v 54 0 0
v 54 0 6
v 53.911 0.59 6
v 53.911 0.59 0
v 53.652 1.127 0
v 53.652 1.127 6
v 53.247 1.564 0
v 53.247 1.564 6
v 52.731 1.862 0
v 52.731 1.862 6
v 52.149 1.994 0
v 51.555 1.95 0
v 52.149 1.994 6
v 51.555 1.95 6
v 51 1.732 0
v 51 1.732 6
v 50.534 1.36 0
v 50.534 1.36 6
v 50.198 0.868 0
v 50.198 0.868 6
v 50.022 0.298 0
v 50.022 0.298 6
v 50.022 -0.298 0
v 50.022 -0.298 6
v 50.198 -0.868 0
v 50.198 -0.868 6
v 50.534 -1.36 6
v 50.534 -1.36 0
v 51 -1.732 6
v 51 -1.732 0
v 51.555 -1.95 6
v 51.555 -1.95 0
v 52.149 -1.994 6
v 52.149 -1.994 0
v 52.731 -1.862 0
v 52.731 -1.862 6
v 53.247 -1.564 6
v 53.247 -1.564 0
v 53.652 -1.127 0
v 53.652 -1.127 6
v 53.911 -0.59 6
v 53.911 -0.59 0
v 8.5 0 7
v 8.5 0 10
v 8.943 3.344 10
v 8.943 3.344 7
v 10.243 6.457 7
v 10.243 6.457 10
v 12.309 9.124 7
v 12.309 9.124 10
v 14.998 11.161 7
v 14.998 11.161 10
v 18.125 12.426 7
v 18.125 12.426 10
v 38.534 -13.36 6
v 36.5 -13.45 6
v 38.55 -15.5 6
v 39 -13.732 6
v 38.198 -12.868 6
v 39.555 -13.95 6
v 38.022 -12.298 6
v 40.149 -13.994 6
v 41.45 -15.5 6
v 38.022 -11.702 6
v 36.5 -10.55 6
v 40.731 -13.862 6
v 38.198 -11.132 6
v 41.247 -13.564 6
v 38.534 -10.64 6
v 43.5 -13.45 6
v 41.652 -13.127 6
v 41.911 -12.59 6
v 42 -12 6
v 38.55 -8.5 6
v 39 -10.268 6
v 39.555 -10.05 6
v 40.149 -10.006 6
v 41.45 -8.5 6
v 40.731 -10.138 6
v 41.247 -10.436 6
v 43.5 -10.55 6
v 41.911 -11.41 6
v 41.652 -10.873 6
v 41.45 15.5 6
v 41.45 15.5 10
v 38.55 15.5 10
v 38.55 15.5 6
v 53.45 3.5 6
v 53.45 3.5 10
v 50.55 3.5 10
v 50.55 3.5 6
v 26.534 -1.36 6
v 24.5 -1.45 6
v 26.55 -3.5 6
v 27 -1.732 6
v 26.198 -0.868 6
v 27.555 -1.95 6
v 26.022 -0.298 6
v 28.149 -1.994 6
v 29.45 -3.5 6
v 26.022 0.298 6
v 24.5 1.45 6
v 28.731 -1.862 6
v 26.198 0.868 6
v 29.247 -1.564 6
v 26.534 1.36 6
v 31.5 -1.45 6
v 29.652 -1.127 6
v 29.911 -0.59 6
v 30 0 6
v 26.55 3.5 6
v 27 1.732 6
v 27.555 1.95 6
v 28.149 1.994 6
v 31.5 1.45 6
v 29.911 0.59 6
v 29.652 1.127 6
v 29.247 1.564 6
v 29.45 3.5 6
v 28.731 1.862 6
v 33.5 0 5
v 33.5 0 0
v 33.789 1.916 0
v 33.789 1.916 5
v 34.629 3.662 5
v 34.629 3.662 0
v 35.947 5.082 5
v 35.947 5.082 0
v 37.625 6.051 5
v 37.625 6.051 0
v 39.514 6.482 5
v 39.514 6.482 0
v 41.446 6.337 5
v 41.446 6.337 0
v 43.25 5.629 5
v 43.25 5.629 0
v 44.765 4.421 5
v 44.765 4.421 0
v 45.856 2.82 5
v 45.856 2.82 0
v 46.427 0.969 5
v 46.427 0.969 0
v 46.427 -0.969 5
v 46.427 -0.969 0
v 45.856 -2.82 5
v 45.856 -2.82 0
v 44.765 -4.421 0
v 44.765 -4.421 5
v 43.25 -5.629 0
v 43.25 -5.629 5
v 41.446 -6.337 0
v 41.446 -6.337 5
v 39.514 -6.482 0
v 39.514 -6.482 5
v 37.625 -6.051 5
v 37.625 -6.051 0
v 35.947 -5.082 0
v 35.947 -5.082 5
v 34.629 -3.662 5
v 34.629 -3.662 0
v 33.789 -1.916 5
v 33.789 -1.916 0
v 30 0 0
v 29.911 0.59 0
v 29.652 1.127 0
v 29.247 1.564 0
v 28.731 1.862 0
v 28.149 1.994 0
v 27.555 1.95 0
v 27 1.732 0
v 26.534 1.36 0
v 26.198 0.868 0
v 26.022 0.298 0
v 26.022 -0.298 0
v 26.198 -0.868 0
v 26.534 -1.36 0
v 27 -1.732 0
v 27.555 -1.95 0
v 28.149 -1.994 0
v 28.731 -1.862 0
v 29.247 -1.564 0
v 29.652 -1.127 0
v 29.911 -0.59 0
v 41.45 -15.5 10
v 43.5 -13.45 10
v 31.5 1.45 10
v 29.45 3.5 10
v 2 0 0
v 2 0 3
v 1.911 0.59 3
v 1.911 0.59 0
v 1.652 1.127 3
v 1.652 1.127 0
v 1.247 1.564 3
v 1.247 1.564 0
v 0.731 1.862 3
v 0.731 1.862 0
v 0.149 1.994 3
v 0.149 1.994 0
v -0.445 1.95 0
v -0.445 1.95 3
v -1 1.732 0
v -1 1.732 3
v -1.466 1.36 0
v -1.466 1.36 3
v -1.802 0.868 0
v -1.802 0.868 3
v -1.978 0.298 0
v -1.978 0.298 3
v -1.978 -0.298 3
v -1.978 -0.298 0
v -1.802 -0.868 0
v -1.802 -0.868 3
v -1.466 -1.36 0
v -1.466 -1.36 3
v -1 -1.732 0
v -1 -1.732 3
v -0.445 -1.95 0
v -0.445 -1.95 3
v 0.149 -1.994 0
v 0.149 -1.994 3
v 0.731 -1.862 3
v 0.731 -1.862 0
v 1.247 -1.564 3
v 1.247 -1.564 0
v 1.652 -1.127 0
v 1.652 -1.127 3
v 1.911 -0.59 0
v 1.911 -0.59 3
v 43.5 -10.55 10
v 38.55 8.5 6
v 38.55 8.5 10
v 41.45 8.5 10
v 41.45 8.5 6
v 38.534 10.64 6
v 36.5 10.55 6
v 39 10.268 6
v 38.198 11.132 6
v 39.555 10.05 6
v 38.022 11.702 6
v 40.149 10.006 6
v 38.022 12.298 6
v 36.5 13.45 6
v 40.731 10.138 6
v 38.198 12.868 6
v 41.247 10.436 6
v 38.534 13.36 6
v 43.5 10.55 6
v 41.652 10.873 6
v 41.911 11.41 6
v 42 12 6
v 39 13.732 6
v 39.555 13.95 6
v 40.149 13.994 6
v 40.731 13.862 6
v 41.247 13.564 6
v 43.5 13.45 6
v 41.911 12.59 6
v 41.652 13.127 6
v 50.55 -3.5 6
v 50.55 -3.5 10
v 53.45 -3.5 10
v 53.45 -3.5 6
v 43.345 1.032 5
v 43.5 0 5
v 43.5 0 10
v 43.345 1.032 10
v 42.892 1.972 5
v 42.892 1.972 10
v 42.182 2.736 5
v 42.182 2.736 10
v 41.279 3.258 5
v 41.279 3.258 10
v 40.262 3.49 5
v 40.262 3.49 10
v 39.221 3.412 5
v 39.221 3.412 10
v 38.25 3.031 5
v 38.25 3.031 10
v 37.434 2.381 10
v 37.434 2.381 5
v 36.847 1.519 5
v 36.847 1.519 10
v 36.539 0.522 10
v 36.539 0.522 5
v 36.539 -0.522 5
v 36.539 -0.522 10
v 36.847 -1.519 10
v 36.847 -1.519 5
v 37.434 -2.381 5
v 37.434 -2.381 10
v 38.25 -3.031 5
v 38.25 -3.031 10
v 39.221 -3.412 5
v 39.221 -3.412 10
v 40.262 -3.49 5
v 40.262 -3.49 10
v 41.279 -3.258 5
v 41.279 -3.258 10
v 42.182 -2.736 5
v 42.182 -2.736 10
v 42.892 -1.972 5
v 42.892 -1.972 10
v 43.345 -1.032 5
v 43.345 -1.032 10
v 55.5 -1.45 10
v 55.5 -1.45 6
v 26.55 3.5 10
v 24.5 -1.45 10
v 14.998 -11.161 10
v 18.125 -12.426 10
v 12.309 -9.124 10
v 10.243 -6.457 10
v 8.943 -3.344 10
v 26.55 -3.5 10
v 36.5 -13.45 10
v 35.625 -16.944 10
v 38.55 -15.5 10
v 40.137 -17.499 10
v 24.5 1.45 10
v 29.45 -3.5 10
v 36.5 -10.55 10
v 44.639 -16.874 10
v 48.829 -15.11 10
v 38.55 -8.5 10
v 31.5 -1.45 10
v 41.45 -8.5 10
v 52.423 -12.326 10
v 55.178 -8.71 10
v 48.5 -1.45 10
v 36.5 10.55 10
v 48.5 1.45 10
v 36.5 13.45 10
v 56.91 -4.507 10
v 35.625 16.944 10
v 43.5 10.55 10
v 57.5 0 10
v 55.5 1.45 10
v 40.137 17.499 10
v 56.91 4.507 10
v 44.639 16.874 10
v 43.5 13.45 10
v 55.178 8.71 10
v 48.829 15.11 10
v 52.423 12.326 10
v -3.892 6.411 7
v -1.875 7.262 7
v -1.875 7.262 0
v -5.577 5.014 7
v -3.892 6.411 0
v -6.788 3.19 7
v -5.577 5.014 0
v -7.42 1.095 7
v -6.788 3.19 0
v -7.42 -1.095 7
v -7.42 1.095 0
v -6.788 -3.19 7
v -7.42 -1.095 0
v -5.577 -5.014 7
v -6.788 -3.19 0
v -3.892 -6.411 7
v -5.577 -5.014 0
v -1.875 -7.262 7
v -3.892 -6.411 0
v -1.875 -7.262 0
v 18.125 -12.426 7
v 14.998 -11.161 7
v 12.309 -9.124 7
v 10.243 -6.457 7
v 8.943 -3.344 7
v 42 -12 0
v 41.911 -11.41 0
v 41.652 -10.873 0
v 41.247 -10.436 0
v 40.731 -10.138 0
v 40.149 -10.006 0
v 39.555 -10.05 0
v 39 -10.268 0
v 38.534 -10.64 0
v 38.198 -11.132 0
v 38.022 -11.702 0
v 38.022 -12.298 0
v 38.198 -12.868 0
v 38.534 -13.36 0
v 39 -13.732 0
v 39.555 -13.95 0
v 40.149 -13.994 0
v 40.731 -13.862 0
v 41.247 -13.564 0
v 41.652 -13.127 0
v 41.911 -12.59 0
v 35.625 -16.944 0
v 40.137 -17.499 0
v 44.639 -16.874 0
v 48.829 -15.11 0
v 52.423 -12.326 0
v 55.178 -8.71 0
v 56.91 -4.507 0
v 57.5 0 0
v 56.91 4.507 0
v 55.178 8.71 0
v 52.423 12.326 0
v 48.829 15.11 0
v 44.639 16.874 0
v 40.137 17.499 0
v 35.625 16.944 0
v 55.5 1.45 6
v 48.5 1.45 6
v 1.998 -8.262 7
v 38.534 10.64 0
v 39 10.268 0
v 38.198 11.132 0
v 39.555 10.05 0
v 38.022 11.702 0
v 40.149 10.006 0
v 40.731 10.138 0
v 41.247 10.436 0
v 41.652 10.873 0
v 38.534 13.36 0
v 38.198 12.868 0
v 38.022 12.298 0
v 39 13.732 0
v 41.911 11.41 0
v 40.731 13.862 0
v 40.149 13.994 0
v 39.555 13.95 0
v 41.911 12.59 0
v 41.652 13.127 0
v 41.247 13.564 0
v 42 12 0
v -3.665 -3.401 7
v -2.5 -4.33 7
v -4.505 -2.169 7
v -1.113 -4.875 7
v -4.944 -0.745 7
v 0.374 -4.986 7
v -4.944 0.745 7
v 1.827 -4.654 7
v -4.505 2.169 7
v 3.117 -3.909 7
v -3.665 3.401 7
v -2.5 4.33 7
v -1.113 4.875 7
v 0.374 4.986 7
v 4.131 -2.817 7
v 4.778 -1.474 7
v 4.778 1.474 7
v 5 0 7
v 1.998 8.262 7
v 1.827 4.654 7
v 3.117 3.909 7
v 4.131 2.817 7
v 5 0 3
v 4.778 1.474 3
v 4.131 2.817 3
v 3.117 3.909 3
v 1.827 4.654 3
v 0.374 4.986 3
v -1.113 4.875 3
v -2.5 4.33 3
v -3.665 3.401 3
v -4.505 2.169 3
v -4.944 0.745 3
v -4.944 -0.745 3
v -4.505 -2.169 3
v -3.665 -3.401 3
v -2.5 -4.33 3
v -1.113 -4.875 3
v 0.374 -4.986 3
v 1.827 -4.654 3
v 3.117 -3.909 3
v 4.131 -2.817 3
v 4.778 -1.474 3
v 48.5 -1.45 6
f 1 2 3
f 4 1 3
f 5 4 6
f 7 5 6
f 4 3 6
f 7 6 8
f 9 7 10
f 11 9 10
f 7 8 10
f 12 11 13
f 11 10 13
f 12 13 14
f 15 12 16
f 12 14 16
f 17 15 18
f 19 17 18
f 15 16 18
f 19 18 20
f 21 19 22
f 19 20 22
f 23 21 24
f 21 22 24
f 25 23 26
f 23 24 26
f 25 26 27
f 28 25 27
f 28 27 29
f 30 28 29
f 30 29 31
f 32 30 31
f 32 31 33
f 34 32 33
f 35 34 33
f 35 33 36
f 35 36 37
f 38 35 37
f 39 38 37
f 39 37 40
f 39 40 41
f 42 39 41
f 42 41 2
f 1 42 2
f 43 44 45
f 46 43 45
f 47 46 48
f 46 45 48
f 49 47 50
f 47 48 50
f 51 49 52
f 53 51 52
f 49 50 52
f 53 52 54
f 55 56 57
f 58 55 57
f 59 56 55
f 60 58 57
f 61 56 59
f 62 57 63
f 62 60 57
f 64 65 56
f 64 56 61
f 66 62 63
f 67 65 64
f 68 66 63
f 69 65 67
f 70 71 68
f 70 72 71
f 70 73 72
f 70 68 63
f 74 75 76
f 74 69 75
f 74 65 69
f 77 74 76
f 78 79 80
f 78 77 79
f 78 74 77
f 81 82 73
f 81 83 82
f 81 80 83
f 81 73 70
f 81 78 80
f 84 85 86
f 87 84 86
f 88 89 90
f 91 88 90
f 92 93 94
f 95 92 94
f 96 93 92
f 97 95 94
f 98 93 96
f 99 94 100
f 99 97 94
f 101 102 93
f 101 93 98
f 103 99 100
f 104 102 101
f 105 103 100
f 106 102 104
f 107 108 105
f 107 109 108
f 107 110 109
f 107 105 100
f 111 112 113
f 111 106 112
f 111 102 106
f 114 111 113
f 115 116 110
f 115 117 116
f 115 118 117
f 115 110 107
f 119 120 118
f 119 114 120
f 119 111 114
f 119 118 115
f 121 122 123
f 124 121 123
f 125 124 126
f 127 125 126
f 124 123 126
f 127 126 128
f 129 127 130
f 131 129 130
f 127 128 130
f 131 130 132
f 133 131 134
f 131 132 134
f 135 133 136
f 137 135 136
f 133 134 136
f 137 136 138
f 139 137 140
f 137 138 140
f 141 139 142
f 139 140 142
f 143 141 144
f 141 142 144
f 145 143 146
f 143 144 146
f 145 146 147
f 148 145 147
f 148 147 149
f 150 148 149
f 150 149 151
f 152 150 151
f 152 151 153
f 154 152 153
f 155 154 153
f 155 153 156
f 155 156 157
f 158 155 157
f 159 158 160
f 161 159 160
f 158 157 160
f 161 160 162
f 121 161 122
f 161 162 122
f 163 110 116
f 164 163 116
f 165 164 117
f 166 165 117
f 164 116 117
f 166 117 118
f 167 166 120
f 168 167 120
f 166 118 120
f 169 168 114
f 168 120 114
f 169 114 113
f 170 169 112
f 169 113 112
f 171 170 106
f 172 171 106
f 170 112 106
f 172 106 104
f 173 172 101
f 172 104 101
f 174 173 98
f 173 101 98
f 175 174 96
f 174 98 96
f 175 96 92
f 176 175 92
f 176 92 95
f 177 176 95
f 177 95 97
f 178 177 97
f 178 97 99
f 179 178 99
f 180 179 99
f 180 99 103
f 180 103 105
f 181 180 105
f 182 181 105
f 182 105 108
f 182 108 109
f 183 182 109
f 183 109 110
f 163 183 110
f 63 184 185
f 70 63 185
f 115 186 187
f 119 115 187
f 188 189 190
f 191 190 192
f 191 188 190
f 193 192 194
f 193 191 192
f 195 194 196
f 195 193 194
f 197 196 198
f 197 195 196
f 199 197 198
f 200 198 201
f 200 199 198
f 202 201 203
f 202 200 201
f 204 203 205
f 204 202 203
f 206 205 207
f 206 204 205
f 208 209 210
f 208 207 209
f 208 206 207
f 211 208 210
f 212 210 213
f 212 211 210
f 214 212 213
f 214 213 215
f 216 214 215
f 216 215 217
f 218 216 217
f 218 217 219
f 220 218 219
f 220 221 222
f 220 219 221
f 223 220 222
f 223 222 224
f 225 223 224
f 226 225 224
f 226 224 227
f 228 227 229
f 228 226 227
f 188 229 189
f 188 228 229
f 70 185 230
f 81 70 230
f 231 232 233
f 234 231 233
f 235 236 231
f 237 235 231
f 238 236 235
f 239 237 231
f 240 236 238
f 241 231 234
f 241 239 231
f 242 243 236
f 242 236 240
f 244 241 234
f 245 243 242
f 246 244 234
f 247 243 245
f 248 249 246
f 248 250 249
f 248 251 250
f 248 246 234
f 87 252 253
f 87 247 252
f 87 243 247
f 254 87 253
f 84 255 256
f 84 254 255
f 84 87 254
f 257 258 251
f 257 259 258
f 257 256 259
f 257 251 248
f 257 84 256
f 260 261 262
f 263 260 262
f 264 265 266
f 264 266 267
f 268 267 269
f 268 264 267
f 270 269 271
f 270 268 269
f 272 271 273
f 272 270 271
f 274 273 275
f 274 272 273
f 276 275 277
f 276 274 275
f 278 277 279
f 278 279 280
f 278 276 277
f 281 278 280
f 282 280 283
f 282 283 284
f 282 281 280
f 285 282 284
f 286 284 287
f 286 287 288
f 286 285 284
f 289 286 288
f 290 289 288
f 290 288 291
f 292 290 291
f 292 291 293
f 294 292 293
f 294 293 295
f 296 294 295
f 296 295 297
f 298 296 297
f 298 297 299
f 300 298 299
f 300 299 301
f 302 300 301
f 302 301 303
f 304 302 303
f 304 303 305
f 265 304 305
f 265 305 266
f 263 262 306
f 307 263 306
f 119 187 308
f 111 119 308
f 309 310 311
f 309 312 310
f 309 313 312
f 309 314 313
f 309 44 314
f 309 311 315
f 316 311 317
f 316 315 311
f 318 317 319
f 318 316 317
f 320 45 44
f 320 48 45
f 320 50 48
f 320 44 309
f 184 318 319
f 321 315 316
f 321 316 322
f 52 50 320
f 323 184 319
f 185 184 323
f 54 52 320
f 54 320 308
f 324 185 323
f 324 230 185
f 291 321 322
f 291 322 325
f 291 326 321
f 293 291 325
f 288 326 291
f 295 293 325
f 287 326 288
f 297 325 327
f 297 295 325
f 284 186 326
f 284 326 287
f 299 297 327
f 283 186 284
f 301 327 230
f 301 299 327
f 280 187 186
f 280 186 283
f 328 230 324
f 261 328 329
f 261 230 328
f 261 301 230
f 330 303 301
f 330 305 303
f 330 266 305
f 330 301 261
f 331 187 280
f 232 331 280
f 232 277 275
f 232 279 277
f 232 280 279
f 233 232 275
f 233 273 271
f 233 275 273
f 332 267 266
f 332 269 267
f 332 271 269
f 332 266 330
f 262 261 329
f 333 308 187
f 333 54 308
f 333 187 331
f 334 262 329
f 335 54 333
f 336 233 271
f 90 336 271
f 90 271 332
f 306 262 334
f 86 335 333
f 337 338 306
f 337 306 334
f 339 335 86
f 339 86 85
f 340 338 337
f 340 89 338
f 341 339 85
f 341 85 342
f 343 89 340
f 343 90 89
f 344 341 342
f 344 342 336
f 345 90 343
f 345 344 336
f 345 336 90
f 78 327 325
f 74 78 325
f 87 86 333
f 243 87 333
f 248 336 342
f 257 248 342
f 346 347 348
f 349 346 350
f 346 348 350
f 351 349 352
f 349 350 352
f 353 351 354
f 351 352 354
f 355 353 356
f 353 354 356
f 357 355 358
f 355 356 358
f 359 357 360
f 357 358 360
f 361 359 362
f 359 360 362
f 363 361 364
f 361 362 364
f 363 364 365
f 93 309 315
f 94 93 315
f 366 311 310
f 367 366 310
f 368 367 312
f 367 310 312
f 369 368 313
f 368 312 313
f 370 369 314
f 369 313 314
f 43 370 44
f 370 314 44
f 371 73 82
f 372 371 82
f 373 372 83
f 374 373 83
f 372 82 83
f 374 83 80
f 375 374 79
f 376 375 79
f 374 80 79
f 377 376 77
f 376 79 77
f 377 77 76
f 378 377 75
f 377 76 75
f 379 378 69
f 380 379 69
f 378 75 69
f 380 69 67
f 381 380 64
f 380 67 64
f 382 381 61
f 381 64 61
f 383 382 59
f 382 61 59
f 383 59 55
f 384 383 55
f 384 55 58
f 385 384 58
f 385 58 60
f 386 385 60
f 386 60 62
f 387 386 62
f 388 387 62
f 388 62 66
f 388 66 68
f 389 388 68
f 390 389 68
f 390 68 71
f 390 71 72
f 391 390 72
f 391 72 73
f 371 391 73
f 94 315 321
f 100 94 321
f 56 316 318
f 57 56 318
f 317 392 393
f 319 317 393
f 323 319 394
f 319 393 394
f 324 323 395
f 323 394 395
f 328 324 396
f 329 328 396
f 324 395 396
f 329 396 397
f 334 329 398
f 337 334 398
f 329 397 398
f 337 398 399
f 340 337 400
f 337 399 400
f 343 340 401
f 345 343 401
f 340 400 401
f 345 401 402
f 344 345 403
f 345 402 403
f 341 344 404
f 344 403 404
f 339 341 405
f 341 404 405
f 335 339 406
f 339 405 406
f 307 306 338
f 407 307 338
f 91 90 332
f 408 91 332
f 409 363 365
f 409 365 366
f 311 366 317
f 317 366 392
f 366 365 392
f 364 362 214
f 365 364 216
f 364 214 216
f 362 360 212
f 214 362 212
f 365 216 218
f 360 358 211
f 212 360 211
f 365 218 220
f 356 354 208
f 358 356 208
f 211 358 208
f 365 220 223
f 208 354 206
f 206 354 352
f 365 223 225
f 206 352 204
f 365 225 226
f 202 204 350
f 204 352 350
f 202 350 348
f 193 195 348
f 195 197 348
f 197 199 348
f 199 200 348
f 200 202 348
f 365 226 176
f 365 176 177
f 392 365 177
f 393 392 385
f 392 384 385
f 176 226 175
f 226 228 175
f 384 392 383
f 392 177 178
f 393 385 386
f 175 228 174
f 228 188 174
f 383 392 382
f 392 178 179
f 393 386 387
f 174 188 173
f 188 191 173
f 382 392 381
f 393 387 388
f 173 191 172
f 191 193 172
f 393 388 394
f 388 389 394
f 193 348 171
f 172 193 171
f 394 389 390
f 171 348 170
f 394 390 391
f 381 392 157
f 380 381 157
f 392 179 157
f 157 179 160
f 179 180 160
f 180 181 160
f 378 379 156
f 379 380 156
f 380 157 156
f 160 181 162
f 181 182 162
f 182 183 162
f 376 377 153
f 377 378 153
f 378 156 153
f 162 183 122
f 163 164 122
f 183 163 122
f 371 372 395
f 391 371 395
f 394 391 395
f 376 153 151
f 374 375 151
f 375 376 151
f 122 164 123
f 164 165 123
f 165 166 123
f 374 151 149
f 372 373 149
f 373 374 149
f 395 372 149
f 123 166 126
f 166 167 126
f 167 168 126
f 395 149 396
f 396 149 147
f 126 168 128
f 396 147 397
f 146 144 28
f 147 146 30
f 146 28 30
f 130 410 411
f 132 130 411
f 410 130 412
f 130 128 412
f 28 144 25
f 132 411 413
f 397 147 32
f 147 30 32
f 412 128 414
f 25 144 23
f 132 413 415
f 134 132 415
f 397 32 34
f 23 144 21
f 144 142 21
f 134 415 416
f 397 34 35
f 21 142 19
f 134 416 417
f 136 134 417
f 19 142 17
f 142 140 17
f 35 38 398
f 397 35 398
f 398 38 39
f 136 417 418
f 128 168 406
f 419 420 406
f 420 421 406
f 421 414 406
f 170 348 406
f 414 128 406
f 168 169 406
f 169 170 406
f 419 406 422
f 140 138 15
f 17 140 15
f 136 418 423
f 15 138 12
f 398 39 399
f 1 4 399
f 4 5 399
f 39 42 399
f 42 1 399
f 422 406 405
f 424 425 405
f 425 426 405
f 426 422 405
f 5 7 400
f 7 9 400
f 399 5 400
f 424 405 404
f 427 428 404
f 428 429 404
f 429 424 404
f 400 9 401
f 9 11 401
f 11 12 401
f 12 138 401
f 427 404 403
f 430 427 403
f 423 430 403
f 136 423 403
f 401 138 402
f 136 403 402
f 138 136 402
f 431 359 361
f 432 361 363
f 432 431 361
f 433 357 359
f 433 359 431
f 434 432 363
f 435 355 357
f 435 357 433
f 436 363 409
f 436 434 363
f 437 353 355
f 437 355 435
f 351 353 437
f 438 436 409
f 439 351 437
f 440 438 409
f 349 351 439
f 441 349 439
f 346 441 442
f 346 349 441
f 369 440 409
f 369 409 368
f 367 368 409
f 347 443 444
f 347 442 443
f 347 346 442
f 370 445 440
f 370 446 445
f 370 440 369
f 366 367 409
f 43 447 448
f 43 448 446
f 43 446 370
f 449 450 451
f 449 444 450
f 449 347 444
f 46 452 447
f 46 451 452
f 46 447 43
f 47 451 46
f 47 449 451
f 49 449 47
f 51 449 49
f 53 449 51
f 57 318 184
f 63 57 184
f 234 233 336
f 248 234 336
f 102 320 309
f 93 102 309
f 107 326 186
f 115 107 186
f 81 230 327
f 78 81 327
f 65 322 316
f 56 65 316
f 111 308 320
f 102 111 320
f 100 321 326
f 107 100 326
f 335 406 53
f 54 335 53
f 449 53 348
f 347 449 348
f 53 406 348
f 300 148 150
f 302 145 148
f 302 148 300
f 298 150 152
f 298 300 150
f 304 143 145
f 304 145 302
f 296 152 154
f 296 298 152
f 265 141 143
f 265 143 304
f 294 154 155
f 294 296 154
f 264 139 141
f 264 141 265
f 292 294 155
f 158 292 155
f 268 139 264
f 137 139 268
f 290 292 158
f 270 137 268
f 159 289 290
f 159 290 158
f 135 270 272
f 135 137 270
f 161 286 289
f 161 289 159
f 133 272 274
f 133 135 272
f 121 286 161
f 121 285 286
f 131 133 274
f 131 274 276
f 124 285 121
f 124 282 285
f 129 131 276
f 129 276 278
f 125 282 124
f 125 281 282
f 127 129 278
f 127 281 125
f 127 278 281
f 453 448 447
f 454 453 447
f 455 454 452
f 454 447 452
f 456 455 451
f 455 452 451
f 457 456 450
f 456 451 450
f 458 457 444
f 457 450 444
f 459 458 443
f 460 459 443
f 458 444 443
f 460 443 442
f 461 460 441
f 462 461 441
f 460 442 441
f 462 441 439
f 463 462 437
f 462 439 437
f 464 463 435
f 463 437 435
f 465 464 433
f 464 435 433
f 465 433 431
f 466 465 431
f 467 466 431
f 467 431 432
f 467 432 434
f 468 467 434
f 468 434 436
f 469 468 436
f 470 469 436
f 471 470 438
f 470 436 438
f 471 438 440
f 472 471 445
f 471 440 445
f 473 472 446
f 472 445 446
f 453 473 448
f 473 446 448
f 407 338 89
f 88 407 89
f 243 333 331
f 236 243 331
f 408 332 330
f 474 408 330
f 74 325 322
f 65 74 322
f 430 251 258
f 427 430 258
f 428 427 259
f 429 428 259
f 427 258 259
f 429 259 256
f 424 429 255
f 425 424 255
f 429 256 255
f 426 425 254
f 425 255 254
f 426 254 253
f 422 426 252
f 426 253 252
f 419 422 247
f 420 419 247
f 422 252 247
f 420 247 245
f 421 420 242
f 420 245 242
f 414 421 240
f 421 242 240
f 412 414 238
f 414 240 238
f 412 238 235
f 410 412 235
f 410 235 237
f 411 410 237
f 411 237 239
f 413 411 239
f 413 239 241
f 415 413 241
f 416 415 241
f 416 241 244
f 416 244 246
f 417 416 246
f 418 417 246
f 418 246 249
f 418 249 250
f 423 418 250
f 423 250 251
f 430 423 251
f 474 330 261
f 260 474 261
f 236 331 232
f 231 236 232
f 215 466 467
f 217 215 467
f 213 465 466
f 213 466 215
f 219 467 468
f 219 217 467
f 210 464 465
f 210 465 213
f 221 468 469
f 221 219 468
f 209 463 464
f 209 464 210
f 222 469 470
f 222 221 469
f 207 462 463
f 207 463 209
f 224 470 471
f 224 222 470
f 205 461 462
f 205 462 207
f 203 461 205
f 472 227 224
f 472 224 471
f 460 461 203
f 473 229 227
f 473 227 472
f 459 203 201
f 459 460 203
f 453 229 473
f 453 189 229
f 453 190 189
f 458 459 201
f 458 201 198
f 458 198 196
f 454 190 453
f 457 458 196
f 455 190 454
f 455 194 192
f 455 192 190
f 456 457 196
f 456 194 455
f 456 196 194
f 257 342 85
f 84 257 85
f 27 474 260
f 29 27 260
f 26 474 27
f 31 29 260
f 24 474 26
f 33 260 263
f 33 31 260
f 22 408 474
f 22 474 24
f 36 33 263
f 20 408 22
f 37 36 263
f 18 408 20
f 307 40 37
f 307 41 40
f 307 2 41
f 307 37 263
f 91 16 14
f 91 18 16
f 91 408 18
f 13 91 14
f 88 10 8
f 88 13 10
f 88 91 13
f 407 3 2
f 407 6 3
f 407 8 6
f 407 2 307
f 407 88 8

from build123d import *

# Parameters (mm, degrees)
SKETCH1_R           = 2
SKETCH1_R_2         = 3.5
BOSS_EXTRUDE1_DEPTH = 10
SKETCH4_R           = 2
CUT_EXTRUDE2_DEPTH  = 61.930288035
CUT_EXTRUDE3_DEPTH  = 4
CUT_EXTRUDE4_START  = -3
SKETCH5_R           = 2
CUT_EXTRUDE4_DEPTH  = 3
SKETCH6_R           = 5
CUT_EXTRUDE5_DEPTH  = 4
SKETCH7_R           = 6.5
CUT_EXTRUDE6_DEPTH  = 5


with BuildPart() as part:
    # Sketch1 → Boss-Extrude1 (new body)
    with BuildSketch(Plane.XY):
        with BuildLine():
            Line((35.625, 16.94430214), (-1.875, 7.261843774))
            ThreePointArc((-1.875, 7.261843774), (-7.5, 0), (-1.875, -7.261843774))
            Line((-1.875, -7.261843774), (35.625, -16.94430214))
            ThreePointArc((35.625, -16.94430214), (57.5, 0), (35.625, 16.94430214))
        make_face()
        Circle(SKETCH1_R, mode=Mode.SUBTRACT)
        with Locations((40, 0)):
            Circle(SKETCH1_R_2, mode=Mode.SUBTRACT)
    extrude(amount=BOSS_EXTRUDE1_DEPTH)

    # Sketch4 → Cut-Extrude2 (cut, through all)
    with BuildSketch(Plane.XY.offset(10)):
        with Locations((28, 0)):
            Circle(SKETCH4_R)
        with Locations((40, -12)):
            Circle(SKETCH4_R)
        with Locations((52, 0)):
            Circle(SKETCH4_R)
        with Locations((40, 12)):
            Circle(SKETCH4_R)
    extrude(amount=-CUT_EXTRUDE2_DEPTH, mode=Mode.SUBTRACT)

    # Sketch4_3 → Cut-Extrude3 (cut)
    with BuildSketch(Plane.XY.offset(10)):
        Polygon((38.550252532, 8.5), (41.449747468, 8.5), (43.5, 10.550252532), (43.5, 13.449747468), (41.449747468, 15.5), (38.550252532, 15.5), (36.5, 13.449747468), (36.5, 10.550252532), align=None)
        Polygon((50.550252532, 3.5), (48.5, 1.449747468), (48.5, -1.449747468), (50.550252532, -3.5), (53.449747468, -3.5), (55.5, -1.449747468), (55.5, 1.449747468), (53.449747468, 3.5), align=None)
        Polygon((43.5, -10.550252532), (41.449747468, -8.5), (38.550252532, -8.5), (36.5, -10.550252532), (36.5, -13.449747468), (38.550252532, -15.5), (41.449747468, -15.5), (43.5, -13.449747468), align=None)
        Polygon((29.449747468, -3.5), (31.5, -1.449747468), (31.5, 1.449747468), (29.449747468, 3.5), (26.550252532, 3.5), (24.5, 1.449747468), (24.5, -1.449747468), (26.550252532, -3.5), align=None)
    extrude(amount=-CUT_EXTRUDE3_DEPTH, mode=Mode.SUBTRACT)

    # Sketch5 → Cut-Extrude4 (cut)
    with BuildSketch(Plane.XY.offset(10).offset(CUT_EXTRUDE4_START)):
        with BuildLine():
            Line((18.124999859, 12.425821533), (-1.875, 7.261843774))
            ThreePointArc((-1.875, 7.261843774), (-7.5, 0), (-1.875, -7.261843774))
            Line((-1.875, -7.261843774), (18.124999918, -12.425821548))
            ThreePointArc((18.124999918, -12.425821548), (8.5, -3.1e-08), (18.124999859, 12.425821533))
        make_face()
        Circle(SKETCH5_R, mode=Mode.SUBTRACT)
    extrude(amount=CUT_EXTRUDE4_DEPTH, mode=Mode.SUBTRACT)

    # Sketch6 → Cut-Extrude5 (cut)
    with BuildSketch(Plane.XY.offset(7)):
        Circle(SKETCH6_R)
    extrude(amount=-CUT_EXTRUDE5_DEPTH, mode=Mode.SUBTRACT)

    # Sketch7 → Cut-Extrude6 (cut)
    with BuildSketch(Plane(origin=(0, 0, 0), x_dir=(-1, 0, 0), z_dir=(0, 0, -1))):
        with Locations((-40, 0)):
            Circle(SKETCH7_R)
    extrude(amount=-CUT_EXTRUDE6_DEPTH, mode=Mode.SUBTRACT)


solid = part.part
